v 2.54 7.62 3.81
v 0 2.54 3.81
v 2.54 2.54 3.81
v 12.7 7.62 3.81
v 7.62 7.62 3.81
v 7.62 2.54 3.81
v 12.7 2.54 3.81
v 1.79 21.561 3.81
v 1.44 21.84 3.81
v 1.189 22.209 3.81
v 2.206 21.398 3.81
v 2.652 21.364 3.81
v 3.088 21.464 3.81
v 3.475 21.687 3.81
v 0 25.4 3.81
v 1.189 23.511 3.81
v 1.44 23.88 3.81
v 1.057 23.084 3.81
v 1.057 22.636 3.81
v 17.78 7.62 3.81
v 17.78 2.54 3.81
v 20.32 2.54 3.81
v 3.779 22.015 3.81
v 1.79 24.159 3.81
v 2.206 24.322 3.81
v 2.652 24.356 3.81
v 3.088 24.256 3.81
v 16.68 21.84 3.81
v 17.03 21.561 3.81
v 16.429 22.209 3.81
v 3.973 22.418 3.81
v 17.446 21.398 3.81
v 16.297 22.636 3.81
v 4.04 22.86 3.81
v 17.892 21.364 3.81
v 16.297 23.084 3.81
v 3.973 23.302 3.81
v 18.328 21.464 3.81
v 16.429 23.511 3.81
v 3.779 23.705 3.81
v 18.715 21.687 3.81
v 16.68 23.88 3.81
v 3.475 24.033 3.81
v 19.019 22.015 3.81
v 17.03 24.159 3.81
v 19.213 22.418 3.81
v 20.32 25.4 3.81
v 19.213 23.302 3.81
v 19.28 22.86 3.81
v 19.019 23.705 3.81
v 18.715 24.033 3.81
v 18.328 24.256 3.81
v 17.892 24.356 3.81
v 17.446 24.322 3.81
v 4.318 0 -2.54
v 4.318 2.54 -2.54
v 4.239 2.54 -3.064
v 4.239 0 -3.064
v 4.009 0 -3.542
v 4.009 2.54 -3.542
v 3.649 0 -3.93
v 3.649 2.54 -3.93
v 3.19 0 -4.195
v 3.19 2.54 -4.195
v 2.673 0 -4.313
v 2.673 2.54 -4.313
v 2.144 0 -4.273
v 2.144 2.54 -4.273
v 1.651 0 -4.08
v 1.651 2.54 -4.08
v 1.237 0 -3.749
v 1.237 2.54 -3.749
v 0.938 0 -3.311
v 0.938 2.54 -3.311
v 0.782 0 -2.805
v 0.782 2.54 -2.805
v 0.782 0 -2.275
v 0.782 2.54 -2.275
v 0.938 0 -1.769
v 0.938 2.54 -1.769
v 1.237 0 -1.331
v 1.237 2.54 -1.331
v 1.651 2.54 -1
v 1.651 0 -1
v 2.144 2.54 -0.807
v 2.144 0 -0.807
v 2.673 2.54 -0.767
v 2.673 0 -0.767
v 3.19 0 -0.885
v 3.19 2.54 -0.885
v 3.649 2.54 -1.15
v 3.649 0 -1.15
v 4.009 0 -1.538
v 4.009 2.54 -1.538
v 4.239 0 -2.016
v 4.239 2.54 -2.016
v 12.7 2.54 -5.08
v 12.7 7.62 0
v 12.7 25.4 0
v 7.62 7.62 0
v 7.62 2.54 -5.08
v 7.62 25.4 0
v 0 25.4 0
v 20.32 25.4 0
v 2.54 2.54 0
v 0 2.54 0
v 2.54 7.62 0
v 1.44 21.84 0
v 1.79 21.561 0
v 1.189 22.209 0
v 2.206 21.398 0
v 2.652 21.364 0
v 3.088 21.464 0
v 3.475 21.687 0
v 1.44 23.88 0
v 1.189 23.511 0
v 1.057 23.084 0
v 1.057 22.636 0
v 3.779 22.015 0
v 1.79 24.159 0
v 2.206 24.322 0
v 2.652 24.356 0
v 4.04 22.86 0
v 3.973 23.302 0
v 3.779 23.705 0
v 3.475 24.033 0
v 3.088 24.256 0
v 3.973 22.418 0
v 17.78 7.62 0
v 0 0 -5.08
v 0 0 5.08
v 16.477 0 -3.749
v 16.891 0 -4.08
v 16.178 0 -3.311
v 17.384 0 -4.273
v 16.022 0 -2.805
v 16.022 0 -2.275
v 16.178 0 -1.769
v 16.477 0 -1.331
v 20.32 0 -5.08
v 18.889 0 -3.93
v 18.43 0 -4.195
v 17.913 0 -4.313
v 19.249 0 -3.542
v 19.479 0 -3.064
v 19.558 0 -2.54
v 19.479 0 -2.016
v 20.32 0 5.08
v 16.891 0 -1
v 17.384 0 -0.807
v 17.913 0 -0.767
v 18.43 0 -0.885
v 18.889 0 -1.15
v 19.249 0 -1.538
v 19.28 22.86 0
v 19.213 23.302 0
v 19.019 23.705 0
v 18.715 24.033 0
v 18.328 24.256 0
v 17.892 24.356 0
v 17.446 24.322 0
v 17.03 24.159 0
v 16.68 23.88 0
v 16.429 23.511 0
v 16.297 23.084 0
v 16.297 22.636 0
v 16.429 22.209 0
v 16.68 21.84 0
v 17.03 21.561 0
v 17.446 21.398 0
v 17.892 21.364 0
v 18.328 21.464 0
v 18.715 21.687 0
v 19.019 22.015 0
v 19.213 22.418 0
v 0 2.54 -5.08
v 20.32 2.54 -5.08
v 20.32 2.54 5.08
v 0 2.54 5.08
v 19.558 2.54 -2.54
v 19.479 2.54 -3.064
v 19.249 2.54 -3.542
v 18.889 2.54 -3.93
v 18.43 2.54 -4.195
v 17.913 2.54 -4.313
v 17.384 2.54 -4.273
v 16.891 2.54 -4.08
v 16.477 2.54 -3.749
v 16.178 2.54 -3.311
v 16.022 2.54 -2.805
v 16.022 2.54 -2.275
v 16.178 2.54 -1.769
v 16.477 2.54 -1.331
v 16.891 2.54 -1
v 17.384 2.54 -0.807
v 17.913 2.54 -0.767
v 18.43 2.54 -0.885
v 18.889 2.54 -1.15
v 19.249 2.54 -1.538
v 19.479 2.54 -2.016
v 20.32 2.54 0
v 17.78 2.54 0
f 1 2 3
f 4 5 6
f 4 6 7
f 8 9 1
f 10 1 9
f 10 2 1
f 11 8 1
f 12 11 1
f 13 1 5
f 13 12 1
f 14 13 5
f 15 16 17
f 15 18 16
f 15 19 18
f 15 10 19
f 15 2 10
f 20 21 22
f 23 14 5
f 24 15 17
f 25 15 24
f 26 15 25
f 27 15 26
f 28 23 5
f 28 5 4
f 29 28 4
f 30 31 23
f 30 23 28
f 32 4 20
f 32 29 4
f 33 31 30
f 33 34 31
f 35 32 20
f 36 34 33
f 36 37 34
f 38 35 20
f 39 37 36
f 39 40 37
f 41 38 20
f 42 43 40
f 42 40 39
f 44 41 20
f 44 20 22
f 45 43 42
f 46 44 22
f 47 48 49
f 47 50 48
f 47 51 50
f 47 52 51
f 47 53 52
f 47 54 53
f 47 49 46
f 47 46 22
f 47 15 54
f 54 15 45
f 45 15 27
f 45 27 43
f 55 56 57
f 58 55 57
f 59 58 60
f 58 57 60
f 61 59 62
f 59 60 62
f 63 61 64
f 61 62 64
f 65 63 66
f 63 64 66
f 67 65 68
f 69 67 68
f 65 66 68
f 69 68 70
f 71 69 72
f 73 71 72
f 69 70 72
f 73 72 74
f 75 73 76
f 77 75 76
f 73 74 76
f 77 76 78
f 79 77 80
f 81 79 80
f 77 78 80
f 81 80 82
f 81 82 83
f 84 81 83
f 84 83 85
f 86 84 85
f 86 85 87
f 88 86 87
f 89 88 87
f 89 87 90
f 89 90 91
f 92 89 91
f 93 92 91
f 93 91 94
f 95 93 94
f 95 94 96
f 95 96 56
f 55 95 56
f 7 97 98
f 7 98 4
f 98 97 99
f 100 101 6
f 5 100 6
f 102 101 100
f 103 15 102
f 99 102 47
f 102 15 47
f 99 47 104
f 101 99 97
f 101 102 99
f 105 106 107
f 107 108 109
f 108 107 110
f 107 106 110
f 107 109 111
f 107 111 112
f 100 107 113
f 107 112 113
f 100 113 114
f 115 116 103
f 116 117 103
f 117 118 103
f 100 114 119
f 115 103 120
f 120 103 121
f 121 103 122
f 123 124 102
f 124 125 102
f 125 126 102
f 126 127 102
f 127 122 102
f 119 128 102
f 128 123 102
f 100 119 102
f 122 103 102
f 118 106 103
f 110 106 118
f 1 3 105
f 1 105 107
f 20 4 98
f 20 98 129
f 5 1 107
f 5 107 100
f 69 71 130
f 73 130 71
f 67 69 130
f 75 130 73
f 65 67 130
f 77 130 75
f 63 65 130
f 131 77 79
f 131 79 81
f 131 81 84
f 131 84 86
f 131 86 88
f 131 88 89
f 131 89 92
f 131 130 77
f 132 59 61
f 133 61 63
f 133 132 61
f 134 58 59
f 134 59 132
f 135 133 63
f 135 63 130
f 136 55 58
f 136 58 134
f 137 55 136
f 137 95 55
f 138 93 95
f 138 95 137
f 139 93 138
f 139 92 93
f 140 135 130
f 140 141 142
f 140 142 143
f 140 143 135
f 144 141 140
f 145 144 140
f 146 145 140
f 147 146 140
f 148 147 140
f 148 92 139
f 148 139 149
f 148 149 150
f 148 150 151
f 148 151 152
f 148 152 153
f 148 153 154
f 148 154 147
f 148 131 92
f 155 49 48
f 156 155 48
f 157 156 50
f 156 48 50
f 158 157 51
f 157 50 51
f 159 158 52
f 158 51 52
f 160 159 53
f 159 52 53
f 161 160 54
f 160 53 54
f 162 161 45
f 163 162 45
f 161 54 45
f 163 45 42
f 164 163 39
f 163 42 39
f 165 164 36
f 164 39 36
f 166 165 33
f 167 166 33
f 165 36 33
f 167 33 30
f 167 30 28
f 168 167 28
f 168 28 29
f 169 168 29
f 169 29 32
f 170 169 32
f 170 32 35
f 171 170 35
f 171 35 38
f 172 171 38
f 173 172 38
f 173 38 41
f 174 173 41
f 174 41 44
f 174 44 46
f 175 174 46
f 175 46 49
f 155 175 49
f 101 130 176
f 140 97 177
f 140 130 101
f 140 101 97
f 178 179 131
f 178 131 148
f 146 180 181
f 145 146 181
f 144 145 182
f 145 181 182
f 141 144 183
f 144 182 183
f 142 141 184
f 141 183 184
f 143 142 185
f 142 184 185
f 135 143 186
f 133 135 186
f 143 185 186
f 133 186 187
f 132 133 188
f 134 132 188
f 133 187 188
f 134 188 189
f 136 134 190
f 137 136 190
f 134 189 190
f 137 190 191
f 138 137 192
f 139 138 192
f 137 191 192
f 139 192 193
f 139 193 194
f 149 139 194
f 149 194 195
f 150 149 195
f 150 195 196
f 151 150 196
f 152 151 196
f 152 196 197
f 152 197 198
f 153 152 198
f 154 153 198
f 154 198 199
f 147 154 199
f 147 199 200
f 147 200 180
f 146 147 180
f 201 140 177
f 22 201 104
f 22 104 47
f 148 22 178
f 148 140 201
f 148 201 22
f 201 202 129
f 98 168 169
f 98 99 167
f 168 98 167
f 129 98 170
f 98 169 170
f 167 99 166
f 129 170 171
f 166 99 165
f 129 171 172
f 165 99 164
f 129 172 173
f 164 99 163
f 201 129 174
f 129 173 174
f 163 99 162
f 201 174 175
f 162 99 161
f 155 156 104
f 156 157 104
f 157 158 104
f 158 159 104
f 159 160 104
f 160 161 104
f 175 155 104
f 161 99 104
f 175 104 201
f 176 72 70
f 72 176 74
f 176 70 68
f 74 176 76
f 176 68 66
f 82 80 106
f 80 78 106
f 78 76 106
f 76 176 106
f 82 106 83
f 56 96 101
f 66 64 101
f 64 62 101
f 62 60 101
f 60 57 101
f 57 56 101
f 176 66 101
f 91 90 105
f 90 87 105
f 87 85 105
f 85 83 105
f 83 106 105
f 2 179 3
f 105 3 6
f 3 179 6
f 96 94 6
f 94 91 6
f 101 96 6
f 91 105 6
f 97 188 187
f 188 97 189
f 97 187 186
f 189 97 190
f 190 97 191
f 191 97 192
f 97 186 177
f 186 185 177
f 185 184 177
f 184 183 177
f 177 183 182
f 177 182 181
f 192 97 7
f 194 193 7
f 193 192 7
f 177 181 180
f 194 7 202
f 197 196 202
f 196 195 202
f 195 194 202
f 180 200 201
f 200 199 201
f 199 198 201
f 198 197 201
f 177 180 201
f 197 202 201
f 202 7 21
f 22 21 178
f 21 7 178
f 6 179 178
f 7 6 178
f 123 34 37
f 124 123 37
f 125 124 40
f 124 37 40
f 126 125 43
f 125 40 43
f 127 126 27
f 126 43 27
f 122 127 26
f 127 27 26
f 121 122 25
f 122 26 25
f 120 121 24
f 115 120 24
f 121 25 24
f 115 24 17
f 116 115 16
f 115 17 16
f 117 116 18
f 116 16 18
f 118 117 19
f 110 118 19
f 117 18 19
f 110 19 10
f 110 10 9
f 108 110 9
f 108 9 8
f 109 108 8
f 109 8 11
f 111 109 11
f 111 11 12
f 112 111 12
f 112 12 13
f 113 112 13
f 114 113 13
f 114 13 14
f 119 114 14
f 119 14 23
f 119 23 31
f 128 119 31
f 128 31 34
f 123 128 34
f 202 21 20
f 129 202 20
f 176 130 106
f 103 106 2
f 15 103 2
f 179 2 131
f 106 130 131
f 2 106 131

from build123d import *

# Parameters (mm, degrees)
SKETCH1_W               = 20.32
SKETCH1_H               = 25.4
BOSS_EXTRUDE1_DEPTH     = 5.08
ELECTRONICS_HOLES_REACH = 7.08
SKETCH2_R               = 1.499997
SKETCH3_W               = 20.32
SKETCH3_H               = 10.16
BOSS_EXTRUDE2_DEPTH     = 2.54
SKETCH4_W               = 20.32
SKETCH4_H               = 22.86
CUT_EXTRUDE2_DEPTH      = 1.27
SKETCH5_R               = 1.778
PLACEMENT_HOLES_DEPTH   = 2.54
SKETCH6_W               = 15.24
SKETCH6_H               = 5.08
CUT_EXTRUDE4_DEPTH      = 9.89
BOSS_EXTRUDE3_DEPTH     = 2.54


with BuildPart() as part:
    # Sketch1 → Boss-Extrude1 (new body)
    with BuildSketch(Plane.XY):
        with Locations((10.16, 12.7)):
            Rectangle(SKETCH1_W, SKETCH1_H)
    extrude(amount=BOSS_EXTRUDE1_DEPTH)

    # Sketch2 → Electronics Holes (cut, up to next)
    with BuildSketch(Plane.XY.offset(5.08), mode=Mode.PRIVATE) as electronics_holes_sk1:
        with Locations((2.54, 22.86)):
            Circle(SKETCH2_R)
    electronics_holes_tool1 = extrude(electronics_holes_sk1.sketch, amount=-ELECTRONICS_HOLES_REACH, mode=Mode.PRIVATE) & part.part
    add(electronics_holes_tool1.solids().sort_by_distance((2.54, 22.86, 5.08))[0], mode=Mode.SUBTRACT)
    # Sketch2 → Electronics Holes (cut, up to next)
    with BuildSketch(Plane.XY.offset(5.08), mode=Mode.PRIVATE) as electronics_holes_sk2:
        with Locations((17.78, 22.86)):
            Circle(SKETCH2_R)
    electronics_holes_tool2 = extrude(electronics_holes_sk2.sketch, amount=-ELECTRONICS_HOLES_REACH, mode=Mode.PRIVATE) & part.part
    add(electronics_holes_tool2.solids().sort_by_distance((17.78, 22.86, 5.08))[0], mode=Mode.SUBTRACT)

    # Sketch3 → Boss-Extrude2 (add)
    with BuildSketch(Plane.XZ):
        with Locations((10.16, 0)):
            Rectangle(SKETCH3_W, SKETCH3_H)
    extrude(amount=-BOSS_EXTRUDE2_DEPTH)

    # Sketch4 → Cut-Extrude2 (cut)
    with BuildSketch(Plane.XY.offset(5.08)):
        with Locations((10.16, 13.97)):
            Rectangle(SKETCH4_W, SKETCH4_H)
    extrude(amount=-CUT_EXTRUDE2_DEPTH, mode=Mode.SUBTRACT)

    # Sketch5 → Placement Holes (cut)
    with BuildSketch(Plane(origin=(0, 2.54, 0), x_dir=(1, 0, 0), z_dir=(0, 1, 0))):
        with Locations((17.78, 2.54)):
            Circle(SKETCH5_R)
        with Locations((2.54, 2.54)):
            Circle(SKETCH5_R)
    extrude(amount=-PLACEMENT_HOLES_DEPTH, mode=Mode.SUBTRACT)

    # Sketch6 → Cut-Extrude4 (cut, through all)
    with BuildSketch(Plane.XY.offset(3.81)):
        with Locations((10.16, 5.08)):
            Rectangle(SKETCH6_W, SKETCH6_H)
    extrude(amount=-CUT_EXTRUDE4_DEPTH, mode=Mode.SUBTRACT)

    # Sketch7 → Boss-Extrude3 (add)
    with BuildSketch(Plane.ZY.offset(-10.16)):
        Polygon((0, 25.4), (-5.08, 2.54), (3.81, 2.54), (3.81, 25.4), align=None)
    boss_extrude3 = extrude(amount=BOSS_EXTRUDE3_DEPTH)

    # Mirror1: Boss-Extrude3 across plane
    add(boss_extrude3.mirror(Plane.ZY.offset(-10.16)))


solid = part.part
